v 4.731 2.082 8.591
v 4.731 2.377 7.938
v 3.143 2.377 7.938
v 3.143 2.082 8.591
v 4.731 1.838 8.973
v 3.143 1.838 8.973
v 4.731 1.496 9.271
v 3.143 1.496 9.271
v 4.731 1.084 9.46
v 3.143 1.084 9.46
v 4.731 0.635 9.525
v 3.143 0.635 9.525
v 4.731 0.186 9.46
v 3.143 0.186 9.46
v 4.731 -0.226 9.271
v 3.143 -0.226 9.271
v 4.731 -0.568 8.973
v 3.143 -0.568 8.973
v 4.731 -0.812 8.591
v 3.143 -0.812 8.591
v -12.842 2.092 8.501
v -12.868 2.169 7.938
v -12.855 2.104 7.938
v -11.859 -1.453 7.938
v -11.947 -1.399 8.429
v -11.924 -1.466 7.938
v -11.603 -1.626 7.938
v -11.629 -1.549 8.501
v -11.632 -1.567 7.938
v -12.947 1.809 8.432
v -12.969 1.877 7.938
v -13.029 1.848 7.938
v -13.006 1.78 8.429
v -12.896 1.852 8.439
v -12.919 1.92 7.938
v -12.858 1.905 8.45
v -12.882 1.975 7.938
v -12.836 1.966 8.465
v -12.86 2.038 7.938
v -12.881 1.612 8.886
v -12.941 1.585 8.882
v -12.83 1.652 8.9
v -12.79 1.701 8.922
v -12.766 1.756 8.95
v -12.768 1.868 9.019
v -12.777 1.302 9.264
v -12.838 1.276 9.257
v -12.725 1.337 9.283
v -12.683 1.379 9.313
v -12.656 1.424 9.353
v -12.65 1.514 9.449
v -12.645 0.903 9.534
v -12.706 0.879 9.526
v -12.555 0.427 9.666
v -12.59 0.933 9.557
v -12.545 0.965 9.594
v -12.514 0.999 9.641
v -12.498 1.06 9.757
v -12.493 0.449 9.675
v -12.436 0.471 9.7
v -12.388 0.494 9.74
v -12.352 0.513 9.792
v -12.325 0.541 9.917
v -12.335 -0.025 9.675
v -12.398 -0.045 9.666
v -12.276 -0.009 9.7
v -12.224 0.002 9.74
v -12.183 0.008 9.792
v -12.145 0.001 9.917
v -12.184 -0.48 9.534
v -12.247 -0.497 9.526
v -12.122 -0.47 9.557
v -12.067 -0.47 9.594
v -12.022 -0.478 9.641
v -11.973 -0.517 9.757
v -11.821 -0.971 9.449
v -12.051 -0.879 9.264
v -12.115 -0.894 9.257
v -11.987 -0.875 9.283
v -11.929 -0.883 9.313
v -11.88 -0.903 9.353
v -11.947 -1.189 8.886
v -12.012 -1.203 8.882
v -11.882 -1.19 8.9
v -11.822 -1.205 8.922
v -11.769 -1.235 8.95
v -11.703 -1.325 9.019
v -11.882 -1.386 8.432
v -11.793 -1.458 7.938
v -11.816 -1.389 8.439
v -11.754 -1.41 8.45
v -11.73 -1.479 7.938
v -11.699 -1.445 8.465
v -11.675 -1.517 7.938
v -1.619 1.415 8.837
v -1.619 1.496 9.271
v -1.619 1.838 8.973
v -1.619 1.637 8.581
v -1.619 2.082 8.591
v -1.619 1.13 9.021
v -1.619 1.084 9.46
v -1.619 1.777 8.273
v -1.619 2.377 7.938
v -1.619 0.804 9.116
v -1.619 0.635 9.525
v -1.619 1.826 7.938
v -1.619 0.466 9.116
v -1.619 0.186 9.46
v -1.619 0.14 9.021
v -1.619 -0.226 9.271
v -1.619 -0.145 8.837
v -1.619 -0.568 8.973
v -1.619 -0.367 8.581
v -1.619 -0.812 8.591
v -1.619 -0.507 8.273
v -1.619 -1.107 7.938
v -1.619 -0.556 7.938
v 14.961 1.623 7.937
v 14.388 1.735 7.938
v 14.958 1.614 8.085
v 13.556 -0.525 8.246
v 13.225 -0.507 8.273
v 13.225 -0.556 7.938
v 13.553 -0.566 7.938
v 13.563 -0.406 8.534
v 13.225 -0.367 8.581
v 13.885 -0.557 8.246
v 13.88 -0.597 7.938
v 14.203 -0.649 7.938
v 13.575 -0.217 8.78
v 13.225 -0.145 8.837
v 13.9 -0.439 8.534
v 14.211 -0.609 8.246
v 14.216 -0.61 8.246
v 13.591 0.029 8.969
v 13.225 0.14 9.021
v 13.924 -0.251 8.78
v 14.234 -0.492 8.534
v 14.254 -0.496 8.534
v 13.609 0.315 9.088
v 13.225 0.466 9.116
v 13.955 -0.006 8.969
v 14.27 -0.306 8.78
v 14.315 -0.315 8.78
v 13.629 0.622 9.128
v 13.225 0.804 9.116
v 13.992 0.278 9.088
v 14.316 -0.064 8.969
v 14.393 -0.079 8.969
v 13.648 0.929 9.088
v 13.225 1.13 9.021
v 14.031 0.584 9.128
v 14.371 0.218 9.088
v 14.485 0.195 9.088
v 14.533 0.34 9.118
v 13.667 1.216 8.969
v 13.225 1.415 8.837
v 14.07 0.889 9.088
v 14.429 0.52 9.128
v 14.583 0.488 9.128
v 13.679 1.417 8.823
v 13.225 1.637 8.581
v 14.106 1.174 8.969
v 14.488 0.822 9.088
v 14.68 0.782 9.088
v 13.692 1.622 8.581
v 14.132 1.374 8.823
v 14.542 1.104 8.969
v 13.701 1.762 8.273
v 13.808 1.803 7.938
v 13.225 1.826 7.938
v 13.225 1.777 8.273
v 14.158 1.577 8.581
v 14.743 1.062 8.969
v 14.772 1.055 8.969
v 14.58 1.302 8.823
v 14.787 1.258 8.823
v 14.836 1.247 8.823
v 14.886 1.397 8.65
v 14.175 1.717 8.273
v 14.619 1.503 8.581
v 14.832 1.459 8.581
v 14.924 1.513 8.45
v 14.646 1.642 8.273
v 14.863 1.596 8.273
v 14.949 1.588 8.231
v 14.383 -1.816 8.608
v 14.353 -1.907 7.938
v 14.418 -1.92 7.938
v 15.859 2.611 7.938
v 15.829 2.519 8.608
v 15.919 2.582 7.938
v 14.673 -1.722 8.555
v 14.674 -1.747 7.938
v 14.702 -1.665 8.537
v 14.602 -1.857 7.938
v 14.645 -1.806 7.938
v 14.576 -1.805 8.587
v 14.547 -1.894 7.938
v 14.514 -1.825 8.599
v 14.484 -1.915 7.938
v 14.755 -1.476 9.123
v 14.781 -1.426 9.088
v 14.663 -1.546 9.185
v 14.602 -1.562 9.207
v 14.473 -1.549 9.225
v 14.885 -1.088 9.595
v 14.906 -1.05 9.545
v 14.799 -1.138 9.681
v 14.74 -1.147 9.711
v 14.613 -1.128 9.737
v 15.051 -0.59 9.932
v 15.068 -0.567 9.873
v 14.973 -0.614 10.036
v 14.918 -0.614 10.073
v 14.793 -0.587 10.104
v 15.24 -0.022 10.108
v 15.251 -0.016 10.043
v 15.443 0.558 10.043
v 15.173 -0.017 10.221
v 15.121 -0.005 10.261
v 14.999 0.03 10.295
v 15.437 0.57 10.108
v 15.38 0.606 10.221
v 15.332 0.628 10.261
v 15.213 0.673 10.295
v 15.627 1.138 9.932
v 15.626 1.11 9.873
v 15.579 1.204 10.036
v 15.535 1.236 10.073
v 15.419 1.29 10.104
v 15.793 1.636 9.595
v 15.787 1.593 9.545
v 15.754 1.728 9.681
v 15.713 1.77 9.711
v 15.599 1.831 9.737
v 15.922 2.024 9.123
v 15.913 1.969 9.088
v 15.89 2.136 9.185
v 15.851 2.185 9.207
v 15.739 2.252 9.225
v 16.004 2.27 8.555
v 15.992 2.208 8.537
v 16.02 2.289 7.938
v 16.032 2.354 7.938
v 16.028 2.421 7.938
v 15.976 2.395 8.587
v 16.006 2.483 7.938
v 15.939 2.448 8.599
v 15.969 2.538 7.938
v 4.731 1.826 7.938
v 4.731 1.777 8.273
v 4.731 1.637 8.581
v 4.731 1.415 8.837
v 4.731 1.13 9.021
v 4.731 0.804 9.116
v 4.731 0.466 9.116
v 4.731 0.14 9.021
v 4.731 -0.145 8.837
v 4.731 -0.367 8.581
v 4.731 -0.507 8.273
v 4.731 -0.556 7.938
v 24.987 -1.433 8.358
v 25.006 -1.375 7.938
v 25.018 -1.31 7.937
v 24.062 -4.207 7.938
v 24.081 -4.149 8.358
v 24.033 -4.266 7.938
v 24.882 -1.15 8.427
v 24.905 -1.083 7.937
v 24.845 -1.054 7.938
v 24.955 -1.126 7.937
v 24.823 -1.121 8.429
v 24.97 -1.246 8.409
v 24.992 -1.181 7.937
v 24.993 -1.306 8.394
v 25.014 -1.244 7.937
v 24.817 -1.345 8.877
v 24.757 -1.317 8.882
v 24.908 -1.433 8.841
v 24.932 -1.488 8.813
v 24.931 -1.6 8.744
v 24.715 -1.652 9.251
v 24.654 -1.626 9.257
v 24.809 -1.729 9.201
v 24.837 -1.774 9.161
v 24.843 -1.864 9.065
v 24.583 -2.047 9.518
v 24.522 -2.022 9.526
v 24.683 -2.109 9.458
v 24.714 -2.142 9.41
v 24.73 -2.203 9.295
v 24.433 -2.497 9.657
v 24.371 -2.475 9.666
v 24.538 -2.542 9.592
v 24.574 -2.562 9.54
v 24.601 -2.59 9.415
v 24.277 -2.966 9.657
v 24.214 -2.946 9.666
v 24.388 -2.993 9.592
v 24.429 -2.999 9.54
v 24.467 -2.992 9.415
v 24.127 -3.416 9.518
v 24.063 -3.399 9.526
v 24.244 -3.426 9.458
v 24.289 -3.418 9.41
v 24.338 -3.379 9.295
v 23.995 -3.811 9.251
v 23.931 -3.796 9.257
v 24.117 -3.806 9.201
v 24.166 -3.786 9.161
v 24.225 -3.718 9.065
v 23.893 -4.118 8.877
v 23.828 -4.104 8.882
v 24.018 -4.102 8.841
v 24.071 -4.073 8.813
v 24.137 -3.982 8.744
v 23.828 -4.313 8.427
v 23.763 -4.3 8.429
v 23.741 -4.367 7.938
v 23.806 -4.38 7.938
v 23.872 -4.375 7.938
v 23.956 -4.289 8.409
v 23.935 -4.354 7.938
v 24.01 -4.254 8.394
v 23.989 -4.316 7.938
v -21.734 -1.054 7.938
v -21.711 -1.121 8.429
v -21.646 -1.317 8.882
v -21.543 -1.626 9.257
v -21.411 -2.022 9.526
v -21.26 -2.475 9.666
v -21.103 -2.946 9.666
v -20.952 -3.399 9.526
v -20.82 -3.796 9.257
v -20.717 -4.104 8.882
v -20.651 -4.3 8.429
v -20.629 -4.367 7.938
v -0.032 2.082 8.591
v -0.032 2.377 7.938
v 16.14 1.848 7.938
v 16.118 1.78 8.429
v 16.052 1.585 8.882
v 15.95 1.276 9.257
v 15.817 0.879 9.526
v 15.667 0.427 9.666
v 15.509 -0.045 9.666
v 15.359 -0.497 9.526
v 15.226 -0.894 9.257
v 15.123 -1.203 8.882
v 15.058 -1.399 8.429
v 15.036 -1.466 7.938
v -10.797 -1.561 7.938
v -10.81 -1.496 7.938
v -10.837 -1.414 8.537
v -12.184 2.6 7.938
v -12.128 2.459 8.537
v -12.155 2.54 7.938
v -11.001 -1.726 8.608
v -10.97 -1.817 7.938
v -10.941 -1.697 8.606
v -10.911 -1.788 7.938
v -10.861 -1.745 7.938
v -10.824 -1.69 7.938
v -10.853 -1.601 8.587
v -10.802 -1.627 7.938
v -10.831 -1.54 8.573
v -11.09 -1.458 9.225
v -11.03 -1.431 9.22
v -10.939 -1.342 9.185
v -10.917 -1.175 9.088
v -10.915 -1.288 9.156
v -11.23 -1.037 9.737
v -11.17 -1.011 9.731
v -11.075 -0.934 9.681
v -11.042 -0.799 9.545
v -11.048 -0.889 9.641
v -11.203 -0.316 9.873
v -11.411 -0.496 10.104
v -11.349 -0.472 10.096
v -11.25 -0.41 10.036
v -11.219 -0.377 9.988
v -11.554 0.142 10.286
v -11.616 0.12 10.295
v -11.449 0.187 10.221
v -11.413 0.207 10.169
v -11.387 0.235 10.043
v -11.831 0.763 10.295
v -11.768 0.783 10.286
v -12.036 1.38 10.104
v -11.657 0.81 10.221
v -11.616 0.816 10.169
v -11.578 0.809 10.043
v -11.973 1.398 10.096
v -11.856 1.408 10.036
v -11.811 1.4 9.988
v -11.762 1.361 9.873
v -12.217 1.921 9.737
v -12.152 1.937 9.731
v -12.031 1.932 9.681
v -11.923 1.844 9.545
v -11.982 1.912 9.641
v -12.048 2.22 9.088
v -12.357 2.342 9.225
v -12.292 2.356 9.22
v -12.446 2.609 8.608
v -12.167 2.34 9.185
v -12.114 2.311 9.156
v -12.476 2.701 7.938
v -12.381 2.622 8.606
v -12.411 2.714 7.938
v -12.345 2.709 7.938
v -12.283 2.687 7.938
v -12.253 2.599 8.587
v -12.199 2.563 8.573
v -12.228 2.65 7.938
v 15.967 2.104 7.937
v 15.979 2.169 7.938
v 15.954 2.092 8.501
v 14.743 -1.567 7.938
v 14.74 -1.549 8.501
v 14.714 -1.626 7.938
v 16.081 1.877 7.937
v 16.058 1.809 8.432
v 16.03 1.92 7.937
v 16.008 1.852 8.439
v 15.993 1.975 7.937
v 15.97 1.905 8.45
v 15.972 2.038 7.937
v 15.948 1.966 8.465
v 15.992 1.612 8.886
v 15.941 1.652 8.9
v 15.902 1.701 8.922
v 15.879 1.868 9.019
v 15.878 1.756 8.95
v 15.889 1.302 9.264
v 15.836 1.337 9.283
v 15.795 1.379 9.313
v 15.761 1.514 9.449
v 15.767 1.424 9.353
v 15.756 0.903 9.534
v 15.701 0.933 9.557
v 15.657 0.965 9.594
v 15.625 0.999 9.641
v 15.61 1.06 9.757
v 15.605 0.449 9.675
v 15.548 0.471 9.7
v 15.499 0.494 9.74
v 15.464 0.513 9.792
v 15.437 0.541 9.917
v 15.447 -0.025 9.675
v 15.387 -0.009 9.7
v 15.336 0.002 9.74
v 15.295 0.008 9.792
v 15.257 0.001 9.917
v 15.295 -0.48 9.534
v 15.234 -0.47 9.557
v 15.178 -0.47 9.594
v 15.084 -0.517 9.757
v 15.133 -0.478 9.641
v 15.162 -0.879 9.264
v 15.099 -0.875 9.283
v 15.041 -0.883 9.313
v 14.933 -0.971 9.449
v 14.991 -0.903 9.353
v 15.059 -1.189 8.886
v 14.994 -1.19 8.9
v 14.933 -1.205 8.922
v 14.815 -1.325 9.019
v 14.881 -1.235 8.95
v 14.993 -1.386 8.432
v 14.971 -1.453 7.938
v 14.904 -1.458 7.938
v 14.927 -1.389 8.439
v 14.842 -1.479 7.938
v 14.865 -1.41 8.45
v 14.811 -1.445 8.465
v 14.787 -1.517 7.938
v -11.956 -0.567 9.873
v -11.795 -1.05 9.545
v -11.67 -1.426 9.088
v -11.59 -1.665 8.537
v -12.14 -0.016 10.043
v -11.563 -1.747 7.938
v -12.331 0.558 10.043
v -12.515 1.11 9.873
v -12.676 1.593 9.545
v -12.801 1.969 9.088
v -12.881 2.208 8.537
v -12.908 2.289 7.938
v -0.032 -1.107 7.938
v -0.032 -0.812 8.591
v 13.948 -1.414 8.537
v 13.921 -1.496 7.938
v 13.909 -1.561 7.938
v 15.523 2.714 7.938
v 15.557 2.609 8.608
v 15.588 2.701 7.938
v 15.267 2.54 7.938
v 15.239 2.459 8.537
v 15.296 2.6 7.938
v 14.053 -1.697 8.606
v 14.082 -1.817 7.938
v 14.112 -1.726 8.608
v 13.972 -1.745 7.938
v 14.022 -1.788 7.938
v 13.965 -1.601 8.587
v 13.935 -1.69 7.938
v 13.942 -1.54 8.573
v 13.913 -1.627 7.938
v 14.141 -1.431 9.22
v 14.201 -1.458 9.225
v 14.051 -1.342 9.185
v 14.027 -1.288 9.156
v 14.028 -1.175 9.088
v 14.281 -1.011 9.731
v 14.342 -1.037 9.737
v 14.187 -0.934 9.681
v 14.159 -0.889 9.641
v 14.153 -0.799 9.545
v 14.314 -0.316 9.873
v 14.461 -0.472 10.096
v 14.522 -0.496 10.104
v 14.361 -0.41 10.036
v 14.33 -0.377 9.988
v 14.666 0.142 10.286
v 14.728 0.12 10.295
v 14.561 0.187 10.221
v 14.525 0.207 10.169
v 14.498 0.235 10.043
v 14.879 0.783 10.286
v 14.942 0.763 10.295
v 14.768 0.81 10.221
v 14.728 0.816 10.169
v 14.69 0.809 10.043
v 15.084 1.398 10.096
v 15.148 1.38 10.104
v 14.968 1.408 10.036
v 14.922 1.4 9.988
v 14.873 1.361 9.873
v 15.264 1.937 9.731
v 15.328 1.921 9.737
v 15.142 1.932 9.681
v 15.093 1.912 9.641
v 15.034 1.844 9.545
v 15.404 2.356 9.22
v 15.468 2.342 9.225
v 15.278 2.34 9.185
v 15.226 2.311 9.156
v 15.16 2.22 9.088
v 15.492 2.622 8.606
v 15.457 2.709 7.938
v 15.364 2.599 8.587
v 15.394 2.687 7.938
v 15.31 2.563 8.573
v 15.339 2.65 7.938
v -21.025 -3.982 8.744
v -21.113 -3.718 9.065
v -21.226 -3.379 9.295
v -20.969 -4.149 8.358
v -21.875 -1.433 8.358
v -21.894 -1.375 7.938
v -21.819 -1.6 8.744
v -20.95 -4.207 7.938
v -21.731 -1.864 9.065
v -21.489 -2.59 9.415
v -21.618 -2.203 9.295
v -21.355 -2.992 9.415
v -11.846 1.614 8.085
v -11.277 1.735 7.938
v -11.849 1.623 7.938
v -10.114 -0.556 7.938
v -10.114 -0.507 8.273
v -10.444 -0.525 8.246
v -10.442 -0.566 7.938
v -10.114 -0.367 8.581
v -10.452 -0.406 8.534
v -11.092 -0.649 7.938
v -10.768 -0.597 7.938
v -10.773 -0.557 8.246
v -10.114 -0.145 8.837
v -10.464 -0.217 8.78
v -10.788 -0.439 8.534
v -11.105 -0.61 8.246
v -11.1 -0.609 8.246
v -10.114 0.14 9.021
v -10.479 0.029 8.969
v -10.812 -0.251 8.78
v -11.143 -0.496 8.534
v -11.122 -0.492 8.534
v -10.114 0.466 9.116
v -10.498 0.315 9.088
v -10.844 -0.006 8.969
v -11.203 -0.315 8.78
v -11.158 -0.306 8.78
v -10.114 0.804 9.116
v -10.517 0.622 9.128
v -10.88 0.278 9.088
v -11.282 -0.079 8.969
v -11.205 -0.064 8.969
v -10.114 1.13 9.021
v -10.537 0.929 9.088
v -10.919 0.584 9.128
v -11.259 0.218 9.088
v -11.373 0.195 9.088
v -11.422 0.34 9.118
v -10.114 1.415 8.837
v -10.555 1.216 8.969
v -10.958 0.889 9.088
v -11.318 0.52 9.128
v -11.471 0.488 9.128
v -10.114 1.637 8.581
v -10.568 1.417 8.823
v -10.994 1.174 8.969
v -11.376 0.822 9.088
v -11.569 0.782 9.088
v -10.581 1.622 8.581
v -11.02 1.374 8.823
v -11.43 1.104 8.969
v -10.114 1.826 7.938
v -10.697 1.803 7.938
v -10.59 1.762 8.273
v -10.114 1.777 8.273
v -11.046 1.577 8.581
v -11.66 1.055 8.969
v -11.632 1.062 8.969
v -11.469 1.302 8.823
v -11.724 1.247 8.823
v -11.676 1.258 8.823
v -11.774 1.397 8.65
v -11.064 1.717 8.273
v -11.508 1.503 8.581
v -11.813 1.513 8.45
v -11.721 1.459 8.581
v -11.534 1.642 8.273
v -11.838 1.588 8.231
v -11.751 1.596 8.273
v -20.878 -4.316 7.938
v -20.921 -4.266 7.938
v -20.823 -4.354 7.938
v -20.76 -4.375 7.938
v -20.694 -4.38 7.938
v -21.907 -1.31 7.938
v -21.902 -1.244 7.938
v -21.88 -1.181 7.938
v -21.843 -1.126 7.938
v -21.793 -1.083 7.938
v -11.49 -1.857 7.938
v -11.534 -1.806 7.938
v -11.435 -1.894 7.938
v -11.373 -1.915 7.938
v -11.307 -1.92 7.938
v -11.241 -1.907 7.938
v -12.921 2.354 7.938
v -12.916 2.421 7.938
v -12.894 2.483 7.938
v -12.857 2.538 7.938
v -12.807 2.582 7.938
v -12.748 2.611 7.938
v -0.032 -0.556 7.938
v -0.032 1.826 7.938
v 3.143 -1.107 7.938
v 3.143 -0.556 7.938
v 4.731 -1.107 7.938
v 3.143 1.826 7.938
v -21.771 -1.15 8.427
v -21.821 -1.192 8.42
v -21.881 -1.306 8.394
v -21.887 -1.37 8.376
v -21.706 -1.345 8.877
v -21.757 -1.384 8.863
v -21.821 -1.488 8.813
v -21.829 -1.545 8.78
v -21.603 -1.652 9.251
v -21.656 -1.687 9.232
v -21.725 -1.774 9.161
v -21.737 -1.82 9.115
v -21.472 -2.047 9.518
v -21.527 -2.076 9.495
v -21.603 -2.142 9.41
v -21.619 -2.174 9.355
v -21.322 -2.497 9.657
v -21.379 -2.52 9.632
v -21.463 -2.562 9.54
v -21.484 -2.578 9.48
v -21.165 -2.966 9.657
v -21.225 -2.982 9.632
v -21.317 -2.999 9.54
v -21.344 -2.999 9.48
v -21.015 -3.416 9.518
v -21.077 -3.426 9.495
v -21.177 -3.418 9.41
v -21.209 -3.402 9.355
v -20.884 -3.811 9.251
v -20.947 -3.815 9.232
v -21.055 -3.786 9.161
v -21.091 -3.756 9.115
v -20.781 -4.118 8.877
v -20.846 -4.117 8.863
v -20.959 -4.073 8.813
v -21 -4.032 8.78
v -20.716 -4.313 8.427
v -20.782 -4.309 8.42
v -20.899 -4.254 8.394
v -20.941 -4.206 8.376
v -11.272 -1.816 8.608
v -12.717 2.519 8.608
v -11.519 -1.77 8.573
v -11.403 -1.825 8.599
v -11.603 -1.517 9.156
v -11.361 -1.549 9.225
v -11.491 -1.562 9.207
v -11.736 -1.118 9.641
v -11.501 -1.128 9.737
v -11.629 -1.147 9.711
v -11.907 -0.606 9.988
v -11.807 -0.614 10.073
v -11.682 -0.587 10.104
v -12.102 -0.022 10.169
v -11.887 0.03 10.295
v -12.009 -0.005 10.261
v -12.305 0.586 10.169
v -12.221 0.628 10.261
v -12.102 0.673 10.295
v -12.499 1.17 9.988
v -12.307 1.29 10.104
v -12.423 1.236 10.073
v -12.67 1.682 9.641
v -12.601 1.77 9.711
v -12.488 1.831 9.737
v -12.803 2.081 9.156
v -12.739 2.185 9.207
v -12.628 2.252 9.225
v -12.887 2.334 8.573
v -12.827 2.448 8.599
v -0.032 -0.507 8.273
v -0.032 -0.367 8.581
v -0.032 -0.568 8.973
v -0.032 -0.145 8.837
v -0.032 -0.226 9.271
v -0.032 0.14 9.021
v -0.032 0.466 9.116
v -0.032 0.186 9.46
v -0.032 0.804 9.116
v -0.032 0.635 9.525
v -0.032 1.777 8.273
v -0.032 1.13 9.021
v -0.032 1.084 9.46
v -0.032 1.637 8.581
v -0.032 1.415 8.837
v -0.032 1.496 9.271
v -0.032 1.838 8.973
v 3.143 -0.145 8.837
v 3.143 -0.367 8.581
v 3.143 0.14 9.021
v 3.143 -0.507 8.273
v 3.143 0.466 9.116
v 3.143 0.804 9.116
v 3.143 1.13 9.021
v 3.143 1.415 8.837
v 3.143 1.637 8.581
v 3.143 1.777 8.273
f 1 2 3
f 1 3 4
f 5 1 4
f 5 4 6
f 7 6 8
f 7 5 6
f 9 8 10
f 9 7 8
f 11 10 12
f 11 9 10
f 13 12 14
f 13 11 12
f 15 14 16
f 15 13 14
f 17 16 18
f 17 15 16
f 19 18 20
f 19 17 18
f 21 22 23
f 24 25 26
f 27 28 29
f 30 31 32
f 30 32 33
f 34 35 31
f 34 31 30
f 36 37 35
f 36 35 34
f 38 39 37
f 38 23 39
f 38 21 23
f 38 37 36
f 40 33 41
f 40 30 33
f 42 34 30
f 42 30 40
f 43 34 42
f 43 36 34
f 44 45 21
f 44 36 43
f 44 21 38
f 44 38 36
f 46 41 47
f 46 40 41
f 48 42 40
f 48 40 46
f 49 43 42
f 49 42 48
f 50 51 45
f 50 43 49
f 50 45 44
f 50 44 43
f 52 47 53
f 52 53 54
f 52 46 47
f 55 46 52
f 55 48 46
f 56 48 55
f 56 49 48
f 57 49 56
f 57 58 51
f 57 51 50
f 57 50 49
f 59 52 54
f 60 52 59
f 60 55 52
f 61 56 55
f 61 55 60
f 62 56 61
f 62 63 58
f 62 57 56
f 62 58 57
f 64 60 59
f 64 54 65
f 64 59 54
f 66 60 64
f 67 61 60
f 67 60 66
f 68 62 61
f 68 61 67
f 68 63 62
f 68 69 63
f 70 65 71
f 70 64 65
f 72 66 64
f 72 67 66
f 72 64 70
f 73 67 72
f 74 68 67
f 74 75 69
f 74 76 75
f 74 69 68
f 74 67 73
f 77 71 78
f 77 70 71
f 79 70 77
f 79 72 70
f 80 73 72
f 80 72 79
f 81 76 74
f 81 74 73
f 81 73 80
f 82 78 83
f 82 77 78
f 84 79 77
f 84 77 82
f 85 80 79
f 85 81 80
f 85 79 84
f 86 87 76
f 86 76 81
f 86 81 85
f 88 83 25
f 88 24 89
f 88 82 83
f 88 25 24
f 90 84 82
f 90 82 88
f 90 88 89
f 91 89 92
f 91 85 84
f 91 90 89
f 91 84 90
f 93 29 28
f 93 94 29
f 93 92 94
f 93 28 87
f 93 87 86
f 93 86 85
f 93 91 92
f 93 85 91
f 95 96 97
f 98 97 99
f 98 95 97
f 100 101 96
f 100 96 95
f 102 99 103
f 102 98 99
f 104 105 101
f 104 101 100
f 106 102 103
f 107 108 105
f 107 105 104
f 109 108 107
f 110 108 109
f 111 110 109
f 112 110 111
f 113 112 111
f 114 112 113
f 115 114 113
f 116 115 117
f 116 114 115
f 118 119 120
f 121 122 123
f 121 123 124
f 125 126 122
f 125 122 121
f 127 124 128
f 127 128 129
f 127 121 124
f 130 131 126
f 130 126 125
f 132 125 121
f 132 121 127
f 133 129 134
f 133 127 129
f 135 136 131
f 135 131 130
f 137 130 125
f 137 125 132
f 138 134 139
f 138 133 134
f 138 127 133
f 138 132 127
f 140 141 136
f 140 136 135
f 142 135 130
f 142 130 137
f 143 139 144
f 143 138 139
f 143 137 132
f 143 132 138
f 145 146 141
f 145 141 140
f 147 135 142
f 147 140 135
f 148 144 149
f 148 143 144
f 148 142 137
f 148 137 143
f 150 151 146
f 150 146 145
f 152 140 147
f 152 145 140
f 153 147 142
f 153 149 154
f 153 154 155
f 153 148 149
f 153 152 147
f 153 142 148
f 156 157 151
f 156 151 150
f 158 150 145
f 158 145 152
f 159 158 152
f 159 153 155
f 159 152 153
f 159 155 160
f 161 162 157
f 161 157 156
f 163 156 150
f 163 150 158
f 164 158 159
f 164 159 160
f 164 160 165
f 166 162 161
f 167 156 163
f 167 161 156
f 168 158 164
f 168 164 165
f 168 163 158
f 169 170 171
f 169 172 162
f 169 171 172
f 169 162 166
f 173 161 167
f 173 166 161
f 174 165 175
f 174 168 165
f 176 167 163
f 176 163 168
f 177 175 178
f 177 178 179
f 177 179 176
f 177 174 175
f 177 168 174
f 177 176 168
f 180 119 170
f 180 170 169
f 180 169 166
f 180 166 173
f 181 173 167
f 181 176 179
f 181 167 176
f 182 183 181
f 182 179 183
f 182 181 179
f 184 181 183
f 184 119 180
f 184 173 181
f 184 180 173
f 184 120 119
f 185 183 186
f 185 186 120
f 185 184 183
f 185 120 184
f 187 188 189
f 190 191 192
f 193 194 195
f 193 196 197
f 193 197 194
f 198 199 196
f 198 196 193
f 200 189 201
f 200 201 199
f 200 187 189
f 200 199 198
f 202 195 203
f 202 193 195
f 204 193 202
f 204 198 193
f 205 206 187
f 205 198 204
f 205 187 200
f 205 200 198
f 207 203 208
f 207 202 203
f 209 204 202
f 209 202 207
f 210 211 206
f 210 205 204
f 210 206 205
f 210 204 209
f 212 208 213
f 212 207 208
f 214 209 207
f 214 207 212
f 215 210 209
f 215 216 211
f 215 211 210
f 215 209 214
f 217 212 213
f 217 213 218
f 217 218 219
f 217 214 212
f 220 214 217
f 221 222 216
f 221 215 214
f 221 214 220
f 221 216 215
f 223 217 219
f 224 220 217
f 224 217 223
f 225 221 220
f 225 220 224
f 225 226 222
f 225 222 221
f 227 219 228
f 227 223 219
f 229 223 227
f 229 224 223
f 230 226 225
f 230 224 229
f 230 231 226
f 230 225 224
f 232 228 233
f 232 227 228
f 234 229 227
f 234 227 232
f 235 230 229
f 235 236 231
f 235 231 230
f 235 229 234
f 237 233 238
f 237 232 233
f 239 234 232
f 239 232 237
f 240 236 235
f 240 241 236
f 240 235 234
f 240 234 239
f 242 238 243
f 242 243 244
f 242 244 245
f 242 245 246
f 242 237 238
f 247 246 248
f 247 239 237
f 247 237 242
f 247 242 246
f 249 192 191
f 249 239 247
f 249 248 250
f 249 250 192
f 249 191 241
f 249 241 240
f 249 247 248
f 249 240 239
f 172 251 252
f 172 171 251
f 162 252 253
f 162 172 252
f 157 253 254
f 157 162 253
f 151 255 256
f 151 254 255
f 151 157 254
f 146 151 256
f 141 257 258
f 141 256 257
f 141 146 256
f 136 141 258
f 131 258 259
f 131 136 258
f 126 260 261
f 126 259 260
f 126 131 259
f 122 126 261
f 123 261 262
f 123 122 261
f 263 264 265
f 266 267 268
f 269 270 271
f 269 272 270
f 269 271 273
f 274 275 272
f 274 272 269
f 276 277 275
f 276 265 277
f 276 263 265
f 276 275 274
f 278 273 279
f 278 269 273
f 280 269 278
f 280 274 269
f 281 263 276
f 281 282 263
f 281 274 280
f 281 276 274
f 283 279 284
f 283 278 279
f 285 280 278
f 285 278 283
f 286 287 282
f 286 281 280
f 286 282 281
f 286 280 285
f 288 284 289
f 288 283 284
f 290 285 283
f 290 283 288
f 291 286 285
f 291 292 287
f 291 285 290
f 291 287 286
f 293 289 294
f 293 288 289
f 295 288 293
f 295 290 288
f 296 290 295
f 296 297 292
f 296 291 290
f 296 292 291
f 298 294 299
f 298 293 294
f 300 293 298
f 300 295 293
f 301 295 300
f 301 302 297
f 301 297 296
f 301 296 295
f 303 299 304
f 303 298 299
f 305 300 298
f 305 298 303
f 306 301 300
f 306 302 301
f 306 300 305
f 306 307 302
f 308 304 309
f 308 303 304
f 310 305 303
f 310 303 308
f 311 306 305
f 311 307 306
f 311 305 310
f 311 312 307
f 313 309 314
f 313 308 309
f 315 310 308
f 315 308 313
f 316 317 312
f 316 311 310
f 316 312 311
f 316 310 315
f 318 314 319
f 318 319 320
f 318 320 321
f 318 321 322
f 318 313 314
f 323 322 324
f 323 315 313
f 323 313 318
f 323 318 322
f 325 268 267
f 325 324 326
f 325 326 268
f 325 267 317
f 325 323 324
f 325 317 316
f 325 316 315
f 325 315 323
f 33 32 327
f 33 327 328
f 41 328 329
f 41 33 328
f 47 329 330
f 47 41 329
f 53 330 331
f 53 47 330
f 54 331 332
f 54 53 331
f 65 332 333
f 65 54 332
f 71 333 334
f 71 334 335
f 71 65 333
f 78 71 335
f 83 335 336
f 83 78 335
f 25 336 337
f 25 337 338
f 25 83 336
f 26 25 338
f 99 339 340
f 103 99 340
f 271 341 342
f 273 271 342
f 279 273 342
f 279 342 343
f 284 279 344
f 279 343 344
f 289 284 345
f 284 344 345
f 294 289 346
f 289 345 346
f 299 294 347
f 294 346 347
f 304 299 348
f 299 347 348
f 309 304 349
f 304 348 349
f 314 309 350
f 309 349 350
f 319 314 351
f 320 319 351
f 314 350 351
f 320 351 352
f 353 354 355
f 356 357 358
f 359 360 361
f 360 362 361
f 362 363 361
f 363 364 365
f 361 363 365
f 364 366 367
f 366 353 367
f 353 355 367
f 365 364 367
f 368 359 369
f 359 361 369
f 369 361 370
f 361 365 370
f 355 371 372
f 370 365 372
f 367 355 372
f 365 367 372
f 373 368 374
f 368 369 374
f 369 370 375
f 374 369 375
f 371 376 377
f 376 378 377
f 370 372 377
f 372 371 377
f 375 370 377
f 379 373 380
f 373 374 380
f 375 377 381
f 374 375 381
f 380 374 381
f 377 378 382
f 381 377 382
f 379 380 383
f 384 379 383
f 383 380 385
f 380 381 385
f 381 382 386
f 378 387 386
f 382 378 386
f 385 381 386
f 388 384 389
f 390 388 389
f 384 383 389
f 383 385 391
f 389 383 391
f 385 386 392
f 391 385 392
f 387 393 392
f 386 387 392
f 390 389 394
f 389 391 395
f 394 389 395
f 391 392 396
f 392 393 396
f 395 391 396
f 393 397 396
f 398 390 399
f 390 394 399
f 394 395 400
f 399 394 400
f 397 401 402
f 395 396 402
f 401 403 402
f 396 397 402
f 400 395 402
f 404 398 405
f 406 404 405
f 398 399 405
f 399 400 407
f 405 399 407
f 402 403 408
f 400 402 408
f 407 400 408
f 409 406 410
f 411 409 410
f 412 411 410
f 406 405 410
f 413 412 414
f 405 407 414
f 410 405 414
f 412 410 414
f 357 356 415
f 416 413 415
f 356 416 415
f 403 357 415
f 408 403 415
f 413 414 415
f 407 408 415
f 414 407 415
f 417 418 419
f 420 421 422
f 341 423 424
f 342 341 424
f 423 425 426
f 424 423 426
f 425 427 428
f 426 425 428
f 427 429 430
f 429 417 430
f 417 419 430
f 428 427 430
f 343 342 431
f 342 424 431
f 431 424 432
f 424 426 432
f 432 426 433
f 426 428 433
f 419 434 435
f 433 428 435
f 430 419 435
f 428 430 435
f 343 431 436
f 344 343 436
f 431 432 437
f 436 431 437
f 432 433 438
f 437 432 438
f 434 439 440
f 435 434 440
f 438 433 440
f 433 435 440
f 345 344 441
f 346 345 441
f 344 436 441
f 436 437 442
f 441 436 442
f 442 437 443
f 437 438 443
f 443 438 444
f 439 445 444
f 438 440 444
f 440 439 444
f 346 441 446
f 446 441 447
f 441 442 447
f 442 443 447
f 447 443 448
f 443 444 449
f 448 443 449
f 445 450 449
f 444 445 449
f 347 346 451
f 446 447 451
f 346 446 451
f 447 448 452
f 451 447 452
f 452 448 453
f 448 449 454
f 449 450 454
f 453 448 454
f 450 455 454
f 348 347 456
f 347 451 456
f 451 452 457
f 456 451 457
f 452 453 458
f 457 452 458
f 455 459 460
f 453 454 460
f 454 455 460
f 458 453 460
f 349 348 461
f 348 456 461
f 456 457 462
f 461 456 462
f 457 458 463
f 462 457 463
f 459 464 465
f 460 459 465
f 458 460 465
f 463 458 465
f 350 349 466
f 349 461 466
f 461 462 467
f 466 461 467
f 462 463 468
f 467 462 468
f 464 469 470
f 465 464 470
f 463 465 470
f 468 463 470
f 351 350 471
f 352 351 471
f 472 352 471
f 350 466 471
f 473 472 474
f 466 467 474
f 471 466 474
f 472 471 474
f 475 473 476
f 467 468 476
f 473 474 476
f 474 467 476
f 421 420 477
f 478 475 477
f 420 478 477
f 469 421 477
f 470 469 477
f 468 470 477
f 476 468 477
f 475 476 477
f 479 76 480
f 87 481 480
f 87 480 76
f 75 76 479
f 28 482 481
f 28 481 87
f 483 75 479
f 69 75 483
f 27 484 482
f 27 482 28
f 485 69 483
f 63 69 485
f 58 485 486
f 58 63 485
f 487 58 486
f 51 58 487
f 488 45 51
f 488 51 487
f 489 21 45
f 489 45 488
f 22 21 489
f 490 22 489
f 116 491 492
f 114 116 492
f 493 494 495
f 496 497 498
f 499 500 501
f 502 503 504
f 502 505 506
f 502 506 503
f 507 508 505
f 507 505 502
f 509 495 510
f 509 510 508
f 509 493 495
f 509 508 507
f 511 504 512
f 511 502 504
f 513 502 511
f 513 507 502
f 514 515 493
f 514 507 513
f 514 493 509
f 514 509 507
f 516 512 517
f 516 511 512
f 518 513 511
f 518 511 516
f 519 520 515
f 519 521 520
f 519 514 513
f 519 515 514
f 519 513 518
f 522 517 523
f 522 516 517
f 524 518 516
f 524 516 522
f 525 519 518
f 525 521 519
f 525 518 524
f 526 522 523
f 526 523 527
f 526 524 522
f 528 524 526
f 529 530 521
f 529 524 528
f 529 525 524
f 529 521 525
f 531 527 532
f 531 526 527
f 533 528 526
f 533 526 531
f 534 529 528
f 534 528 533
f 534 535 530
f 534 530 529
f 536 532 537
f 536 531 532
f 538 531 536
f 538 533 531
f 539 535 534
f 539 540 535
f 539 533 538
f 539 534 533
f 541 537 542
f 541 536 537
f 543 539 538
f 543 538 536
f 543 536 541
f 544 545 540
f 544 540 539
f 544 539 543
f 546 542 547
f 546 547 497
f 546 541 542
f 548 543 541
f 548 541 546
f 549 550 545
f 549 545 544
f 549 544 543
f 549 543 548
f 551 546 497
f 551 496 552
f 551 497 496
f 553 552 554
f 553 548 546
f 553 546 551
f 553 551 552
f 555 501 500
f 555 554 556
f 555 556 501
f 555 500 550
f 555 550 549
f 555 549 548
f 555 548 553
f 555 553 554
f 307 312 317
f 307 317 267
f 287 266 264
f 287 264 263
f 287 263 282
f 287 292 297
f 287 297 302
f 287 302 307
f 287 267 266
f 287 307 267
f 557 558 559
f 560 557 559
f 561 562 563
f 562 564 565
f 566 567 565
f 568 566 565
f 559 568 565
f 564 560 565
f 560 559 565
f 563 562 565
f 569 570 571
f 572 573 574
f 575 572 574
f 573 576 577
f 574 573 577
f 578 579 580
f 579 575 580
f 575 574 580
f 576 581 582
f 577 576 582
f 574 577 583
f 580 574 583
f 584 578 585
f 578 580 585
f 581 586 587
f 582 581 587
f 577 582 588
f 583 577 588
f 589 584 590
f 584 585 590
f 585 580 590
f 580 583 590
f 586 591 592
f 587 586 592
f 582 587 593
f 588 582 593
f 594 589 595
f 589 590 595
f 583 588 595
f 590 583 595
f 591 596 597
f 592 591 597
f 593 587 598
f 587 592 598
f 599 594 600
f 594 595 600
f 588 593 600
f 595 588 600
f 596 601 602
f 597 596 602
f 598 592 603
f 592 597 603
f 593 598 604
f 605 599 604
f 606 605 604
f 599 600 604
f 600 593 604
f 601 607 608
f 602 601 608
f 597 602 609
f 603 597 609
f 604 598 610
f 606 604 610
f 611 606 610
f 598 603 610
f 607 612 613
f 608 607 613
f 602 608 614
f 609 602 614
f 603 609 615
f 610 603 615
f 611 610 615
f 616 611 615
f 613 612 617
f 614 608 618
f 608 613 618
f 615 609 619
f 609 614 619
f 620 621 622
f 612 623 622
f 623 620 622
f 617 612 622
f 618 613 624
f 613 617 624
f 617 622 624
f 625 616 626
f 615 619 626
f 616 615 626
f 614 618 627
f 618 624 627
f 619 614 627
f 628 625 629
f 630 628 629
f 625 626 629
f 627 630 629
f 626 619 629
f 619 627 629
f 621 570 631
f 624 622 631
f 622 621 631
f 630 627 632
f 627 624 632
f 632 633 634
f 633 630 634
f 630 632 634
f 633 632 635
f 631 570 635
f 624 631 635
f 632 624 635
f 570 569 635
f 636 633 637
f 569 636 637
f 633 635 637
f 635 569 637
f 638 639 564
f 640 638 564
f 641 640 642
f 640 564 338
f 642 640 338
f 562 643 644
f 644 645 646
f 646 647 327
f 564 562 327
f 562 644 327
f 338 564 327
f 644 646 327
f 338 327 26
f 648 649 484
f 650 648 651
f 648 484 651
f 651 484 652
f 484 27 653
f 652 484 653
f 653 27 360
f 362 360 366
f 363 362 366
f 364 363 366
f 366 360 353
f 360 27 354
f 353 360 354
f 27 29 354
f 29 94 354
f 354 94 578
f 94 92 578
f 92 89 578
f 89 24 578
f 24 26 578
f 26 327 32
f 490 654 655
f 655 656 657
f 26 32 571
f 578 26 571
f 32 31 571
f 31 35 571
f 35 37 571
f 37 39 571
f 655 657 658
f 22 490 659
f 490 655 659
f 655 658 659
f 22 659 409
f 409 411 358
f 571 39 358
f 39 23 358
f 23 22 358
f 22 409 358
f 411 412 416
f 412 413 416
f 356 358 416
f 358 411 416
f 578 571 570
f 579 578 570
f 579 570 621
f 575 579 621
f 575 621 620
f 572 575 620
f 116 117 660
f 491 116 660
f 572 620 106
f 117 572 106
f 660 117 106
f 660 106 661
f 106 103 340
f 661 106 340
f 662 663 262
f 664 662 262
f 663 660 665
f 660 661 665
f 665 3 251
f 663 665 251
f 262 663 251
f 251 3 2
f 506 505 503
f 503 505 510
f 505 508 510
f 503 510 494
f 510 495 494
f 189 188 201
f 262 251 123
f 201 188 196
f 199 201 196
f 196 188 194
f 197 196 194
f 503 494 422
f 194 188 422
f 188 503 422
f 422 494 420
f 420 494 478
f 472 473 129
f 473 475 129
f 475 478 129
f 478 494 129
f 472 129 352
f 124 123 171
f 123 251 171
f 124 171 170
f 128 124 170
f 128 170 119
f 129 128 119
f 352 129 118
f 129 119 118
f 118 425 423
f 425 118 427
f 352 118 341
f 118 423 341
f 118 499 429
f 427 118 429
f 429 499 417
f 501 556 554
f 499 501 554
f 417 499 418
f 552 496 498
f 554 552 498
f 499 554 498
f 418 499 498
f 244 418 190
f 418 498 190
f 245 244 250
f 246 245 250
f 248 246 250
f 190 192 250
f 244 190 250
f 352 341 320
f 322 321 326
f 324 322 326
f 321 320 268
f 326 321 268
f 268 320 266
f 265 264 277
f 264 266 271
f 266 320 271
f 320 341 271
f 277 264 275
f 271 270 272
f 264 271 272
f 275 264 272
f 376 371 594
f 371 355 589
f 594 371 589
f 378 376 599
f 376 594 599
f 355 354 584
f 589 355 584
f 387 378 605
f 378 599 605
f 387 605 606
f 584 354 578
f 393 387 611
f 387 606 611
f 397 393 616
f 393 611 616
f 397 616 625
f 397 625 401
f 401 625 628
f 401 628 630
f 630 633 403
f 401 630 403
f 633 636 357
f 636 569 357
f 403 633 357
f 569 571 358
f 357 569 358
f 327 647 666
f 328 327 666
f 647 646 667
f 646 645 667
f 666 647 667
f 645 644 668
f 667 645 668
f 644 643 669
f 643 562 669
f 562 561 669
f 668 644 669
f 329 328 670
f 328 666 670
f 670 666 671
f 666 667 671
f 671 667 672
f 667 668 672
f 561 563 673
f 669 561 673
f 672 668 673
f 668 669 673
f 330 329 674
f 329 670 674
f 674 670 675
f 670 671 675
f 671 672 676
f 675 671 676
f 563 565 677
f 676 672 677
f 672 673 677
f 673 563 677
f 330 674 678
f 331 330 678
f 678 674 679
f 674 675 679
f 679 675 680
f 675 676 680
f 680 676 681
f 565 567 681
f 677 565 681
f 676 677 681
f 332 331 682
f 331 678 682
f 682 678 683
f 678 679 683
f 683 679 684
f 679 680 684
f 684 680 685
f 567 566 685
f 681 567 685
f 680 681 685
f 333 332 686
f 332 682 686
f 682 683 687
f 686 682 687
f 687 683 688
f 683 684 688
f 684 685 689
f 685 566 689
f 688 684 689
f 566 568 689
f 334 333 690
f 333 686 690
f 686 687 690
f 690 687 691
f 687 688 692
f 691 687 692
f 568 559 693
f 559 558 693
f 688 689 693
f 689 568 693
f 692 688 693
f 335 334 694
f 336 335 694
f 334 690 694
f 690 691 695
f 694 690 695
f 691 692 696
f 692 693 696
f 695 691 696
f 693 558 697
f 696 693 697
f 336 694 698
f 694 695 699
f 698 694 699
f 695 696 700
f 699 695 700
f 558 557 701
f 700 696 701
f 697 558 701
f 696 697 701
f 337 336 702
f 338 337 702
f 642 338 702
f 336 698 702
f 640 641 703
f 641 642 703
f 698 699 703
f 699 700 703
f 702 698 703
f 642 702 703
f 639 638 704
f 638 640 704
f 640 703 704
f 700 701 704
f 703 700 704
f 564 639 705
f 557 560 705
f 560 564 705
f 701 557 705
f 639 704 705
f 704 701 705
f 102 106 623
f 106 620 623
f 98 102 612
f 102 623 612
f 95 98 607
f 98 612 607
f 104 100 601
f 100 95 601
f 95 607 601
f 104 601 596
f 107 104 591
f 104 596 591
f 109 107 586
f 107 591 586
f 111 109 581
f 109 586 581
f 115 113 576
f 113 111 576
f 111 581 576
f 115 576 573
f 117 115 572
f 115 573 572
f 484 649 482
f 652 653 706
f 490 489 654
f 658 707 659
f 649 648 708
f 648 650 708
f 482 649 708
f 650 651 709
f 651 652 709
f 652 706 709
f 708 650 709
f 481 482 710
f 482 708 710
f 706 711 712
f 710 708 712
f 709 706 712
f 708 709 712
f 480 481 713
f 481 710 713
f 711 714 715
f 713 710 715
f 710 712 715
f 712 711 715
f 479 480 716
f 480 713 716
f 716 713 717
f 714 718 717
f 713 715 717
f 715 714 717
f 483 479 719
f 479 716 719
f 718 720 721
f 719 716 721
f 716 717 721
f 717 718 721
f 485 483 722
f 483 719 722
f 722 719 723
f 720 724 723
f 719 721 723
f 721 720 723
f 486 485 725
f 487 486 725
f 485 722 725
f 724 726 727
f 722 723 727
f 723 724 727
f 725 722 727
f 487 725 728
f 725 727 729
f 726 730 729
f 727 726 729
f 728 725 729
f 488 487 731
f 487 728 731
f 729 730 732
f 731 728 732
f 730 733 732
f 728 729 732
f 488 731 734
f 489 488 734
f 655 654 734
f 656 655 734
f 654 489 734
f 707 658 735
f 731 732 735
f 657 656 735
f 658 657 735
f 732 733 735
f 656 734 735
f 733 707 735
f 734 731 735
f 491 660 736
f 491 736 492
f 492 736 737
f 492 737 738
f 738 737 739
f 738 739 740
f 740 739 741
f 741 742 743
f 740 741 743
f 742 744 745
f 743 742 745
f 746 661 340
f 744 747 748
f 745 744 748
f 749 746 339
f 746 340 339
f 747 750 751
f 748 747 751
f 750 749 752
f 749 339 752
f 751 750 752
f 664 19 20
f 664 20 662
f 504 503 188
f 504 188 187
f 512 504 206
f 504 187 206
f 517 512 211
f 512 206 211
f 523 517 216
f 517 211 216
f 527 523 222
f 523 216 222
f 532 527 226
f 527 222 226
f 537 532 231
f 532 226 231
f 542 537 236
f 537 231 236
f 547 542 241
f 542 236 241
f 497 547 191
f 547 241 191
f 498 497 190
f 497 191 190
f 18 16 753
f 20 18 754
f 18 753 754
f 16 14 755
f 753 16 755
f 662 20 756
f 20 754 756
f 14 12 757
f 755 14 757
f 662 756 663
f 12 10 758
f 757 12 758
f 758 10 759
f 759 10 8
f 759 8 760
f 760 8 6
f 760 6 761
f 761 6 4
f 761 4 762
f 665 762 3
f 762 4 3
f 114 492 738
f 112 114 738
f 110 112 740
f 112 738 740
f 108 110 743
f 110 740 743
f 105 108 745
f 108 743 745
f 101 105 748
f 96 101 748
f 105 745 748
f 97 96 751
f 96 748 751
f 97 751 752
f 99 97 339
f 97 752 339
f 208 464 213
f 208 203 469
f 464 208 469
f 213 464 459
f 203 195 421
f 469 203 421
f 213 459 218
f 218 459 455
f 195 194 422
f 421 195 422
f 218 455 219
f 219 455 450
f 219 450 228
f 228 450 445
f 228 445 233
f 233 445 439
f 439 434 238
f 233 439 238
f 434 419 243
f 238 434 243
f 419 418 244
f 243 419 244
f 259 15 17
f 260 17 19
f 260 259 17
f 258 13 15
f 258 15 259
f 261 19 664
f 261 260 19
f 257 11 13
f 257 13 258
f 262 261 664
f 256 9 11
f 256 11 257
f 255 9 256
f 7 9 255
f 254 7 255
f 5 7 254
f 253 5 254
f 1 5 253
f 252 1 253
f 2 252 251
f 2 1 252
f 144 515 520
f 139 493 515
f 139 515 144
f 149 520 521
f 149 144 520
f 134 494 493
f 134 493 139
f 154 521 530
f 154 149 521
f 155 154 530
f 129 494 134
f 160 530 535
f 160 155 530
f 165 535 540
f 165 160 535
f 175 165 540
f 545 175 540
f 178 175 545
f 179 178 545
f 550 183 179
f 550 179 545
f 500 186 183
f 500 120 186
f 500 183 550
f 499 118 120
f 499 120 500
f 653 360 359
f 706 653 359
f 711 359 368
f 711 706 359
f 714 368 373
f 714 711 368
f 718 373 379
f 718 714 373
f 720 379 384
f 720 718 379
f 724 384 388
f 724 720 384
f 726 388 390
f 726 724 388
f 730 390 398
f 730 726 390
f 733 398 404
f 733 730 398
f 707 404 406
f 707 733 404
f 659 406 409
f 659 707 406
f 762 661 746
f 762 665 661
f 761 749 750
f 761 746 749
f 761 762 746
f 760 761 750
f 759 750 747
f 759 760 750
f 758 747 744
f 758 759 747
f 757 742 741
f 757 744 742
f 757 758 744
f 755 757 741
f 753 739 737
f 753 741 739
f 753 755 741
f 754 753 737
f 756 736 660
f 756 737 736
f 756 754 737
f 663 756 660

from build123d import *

# Parameters (mm, degrees)
SKETCH1_W            = 6.35
SKETCH1_H            = 6.35
BOSS_EXTRUDE1_DEPTH  = 4.7625
SKETCH3_R            = 1.5875
BOSS_EXTRUDE2_DEPTH  = 1.5875
BOSS_EXTRUDE3_START  = -1.5875
SKETCH4_R            = 1.5875
BOSS_EXTRUDE3_DEPTH  = 1.5875
SKETCH5_R            = 1.190625
BOSS_EXTRUDE4_START  = -8.89
SKETCH7_R            = 1.74625
BOSS_EXTRUDE4_DEPTH  = 9.68375
SKETCH8_R            = 2.38125
BOSS_EXTRUDE5_DEPTH  = 0.79375
FILLET2_R            = 0.254
FILLET3_R            = 0.254
FILLET4_R            = 0.254
FILLET2_OF_MIRROR3_R = 0.254
FILLET3_OF_MIRROR3_R = 0.254
FILLET4_OF_MIRROR3_R = 0.254
SKETCH9_W            = 52.511518924
SKETCH9_H            = 9.759118081
CUT_EXTRUDE1_DEPTH   = 27.610644864


with BuildPart() as part:
    # Sketch1 → Boss-Extrude1 (new body)
    with BuildSketch(Plane.XY):
        with Locations((1.55575, 0.635)):
            Rectangle(SKETCH1_W, SKETCH1_H)
    extrude(amount=BOSS_EXTRUDE1_DEPTH)

    # Sketch3 → Boss-Extrude2 (add)
    with BuildSketch(Plane(origin=(4.73075, 0, 0), x_dir=(0, 0, -1), z_dir=(1, 0, 0))):
        with Locations((-7.9375, 0.635)):
            Circle(SKETCH3_R)
        with BuildLine():
            Line((-4.7625, -2.54), (-4.7625, 3.81))
            Line((-4.7625, 3.81), (-8.590657552, 2.081907552))
            ThreePointArc((-8.590657552, 2.081907552), (-7.076318069, 1.968612362), (-6.35, 0.635))
            ThreePointArc((-6.35, 0.635), (-7.076318069, -0.698612362), (-8.590657552, -0.811907552))
            Line((-8.590657552, -0.811907552), (-4.7625, -2.54))
        make_face()
    extrude(amount=-BOSS_EXTRUDE2_DEPTH)

    # Sketch4 → Boss-Extrude3 (add)
    with BuildSketch(Plane.ZY.offset(1.61925).offset(BOSS_EXTRUDE3_START)):
        with BuildLine():
            Line((4.7625, -2.54), (8.590657552, -0.811907552))
            ThreePointArc((8.590657552, -0.811907552), (6.35, 0.635), (8.590657552, 2.081907552))
            Line((8.590657552, 2.081907552), (4.7625, 3.81))
            Line((4.7625, 3.81), (4.7625, -2.54))
        make_face()
        with Locations((7.9375, 0.635)):
            Circle(SKETCH4_R)
    extrude(amount=BOSS_EXTRUDE3_DEPTH)

    # Sweep1: sweep along a path in Sketch6
    with BuildLine(Plane.XY.offset(7.9375)) as sweep1_path:
        Line((-1.61925, 0.635), (4.73075, 0.635))
        Line((4.73075, 0.635), (13.225286858, 0.635))
        ThreePointArc((13.225286858, 0.635), (14.242444101, 0.553005356), (15.233333172, 0.309138943))
        Line((15.233333172, 0.309138943), (23.78075, -2.54))
    # Sketch5 → Sweep1 (sweep)
    with BuildSketch(Plane.ZY.offset(1.61925)):
        with Locations((7.9375, 0.635)):
            Circle(SKETCH5_R)
    sweep1 = sweep(path=sweep1_path.line)

    # Mirror1: Sweep1 across plane
    add(sweep1.mirror(Plane.ZY.offset(-1.55575)))

    # Sketch7 → Boss-Extrude4 (add)
    with BuildSketch(Plane(origin=(22.164675, -7.388225, 0), x_dir=(0, 0, -1), z_dir=(0.9486832980505139, -0.31622776601683794, 0)).offset(BOSS_EXTRUDE4_START)):
        with Locations(Location((-7.9375, 5.11047787, 0), (0, 0, 90))):
            Circle(SKETCH7_R)
    boss_extrude4 = extrude(amount=BOSS_EXTRUDE4_DEPTH)

    # Sketch8 → Boss-Extrude5 (add)
    with BuildSketch(Plane(origin=(13.73088048, -4.57696016, 0), x_dir=(0, 0, 1), z_dir=(-0.9486832980505139, 0.316227766016838, 0))):
        with Locations(Location((7.9375, 5.11047787, 0), (0, 0, 90))):
            Circle(SKETCH8_R)
    boss_extrude5 = extrude(amount=BOSS_EXTRUDE5_DEPTH)

    # Fillet2
    fillet2_edges = [part.edges().sort_by_distance(p)[0] for p in [
        (23.981554631, -4.447643999, 7.9375),
    ]]
    fillet(fillet2_edges, radius=FILLET2_R)

    # Fillet3
    fillet3_edges = [part.edges().sort_by_distance(p)[0] for p in [
        (14.794742744, -1.385373369, 7.9375),
    ]]
    fillet(fillet3_edges, radius=FILLET3_R)

    # Fillet4
    fillet4_edges = [part.edges().sort_by_distance(p)[0] for p in [
        (13.840920745, -1.736781474, 7.9375),
        (14.593938113, -1.987787264, 7.9375),
    ]]
    fillet(fillet4_edges, radius=FILLET4_R)

    # Mirror3: Boss-Extrude4, Boss-Extrude5 across plane
    add(boss_extrude4.mirror(Plane.ZY.offset(-1.55575)))
    add(boss_extrude5.mirror(Plane.ZY.offset(-1.55575)))

    # Fillet2 of Mirror3
    fillet2_of_mirror3_edges = [part.edges().sort_by_distance(p)[0] for p in [
        (-20.870054631, -4.447643999, 7.9375),
    ]]
    fillet(fillet2_of_mirror3_edges, radius=FILLET2_OF_MIRROR3_R)

    # Fillet3 of Mirror3
    fillet3_of_mirror3_edges = [part.edges().sort_by_distance(p)[0] for p in [
        (-11.683242744, -1.385373369, 7.9375),
    ]]
    fillet(fillet3_of_mirror3_edges, radius=FILLET3_OF_MIRROR3_R)

    # Fillet4 of Mirror3
    fillet4_of_mirror3_edges = [part.edges().sort_by_distance(p)[0] for p in [
        (-10.729420745, -1.736781474, 7.9375),
        (-11.482438113, -1.987787264, 7.9375),
    ]]
    fillet(fillet4_of_mirror3_edges, radius=FILLET4_OF_MIRROR3_R)

    # Sketch9 → Cut-Extrude1 (cut, through all)
    with BuildSketch(Plane.XY.offset(7.9375)):
        with Locations((1.780183147, -0.320056159)):
            Rectangle(SKETCH9_W, SKETCH9_H)
    extrude(amount=-CUT_EXTRUDE1_DEPTH, mode=Mode.SUBTRACT)


solid = part.part
